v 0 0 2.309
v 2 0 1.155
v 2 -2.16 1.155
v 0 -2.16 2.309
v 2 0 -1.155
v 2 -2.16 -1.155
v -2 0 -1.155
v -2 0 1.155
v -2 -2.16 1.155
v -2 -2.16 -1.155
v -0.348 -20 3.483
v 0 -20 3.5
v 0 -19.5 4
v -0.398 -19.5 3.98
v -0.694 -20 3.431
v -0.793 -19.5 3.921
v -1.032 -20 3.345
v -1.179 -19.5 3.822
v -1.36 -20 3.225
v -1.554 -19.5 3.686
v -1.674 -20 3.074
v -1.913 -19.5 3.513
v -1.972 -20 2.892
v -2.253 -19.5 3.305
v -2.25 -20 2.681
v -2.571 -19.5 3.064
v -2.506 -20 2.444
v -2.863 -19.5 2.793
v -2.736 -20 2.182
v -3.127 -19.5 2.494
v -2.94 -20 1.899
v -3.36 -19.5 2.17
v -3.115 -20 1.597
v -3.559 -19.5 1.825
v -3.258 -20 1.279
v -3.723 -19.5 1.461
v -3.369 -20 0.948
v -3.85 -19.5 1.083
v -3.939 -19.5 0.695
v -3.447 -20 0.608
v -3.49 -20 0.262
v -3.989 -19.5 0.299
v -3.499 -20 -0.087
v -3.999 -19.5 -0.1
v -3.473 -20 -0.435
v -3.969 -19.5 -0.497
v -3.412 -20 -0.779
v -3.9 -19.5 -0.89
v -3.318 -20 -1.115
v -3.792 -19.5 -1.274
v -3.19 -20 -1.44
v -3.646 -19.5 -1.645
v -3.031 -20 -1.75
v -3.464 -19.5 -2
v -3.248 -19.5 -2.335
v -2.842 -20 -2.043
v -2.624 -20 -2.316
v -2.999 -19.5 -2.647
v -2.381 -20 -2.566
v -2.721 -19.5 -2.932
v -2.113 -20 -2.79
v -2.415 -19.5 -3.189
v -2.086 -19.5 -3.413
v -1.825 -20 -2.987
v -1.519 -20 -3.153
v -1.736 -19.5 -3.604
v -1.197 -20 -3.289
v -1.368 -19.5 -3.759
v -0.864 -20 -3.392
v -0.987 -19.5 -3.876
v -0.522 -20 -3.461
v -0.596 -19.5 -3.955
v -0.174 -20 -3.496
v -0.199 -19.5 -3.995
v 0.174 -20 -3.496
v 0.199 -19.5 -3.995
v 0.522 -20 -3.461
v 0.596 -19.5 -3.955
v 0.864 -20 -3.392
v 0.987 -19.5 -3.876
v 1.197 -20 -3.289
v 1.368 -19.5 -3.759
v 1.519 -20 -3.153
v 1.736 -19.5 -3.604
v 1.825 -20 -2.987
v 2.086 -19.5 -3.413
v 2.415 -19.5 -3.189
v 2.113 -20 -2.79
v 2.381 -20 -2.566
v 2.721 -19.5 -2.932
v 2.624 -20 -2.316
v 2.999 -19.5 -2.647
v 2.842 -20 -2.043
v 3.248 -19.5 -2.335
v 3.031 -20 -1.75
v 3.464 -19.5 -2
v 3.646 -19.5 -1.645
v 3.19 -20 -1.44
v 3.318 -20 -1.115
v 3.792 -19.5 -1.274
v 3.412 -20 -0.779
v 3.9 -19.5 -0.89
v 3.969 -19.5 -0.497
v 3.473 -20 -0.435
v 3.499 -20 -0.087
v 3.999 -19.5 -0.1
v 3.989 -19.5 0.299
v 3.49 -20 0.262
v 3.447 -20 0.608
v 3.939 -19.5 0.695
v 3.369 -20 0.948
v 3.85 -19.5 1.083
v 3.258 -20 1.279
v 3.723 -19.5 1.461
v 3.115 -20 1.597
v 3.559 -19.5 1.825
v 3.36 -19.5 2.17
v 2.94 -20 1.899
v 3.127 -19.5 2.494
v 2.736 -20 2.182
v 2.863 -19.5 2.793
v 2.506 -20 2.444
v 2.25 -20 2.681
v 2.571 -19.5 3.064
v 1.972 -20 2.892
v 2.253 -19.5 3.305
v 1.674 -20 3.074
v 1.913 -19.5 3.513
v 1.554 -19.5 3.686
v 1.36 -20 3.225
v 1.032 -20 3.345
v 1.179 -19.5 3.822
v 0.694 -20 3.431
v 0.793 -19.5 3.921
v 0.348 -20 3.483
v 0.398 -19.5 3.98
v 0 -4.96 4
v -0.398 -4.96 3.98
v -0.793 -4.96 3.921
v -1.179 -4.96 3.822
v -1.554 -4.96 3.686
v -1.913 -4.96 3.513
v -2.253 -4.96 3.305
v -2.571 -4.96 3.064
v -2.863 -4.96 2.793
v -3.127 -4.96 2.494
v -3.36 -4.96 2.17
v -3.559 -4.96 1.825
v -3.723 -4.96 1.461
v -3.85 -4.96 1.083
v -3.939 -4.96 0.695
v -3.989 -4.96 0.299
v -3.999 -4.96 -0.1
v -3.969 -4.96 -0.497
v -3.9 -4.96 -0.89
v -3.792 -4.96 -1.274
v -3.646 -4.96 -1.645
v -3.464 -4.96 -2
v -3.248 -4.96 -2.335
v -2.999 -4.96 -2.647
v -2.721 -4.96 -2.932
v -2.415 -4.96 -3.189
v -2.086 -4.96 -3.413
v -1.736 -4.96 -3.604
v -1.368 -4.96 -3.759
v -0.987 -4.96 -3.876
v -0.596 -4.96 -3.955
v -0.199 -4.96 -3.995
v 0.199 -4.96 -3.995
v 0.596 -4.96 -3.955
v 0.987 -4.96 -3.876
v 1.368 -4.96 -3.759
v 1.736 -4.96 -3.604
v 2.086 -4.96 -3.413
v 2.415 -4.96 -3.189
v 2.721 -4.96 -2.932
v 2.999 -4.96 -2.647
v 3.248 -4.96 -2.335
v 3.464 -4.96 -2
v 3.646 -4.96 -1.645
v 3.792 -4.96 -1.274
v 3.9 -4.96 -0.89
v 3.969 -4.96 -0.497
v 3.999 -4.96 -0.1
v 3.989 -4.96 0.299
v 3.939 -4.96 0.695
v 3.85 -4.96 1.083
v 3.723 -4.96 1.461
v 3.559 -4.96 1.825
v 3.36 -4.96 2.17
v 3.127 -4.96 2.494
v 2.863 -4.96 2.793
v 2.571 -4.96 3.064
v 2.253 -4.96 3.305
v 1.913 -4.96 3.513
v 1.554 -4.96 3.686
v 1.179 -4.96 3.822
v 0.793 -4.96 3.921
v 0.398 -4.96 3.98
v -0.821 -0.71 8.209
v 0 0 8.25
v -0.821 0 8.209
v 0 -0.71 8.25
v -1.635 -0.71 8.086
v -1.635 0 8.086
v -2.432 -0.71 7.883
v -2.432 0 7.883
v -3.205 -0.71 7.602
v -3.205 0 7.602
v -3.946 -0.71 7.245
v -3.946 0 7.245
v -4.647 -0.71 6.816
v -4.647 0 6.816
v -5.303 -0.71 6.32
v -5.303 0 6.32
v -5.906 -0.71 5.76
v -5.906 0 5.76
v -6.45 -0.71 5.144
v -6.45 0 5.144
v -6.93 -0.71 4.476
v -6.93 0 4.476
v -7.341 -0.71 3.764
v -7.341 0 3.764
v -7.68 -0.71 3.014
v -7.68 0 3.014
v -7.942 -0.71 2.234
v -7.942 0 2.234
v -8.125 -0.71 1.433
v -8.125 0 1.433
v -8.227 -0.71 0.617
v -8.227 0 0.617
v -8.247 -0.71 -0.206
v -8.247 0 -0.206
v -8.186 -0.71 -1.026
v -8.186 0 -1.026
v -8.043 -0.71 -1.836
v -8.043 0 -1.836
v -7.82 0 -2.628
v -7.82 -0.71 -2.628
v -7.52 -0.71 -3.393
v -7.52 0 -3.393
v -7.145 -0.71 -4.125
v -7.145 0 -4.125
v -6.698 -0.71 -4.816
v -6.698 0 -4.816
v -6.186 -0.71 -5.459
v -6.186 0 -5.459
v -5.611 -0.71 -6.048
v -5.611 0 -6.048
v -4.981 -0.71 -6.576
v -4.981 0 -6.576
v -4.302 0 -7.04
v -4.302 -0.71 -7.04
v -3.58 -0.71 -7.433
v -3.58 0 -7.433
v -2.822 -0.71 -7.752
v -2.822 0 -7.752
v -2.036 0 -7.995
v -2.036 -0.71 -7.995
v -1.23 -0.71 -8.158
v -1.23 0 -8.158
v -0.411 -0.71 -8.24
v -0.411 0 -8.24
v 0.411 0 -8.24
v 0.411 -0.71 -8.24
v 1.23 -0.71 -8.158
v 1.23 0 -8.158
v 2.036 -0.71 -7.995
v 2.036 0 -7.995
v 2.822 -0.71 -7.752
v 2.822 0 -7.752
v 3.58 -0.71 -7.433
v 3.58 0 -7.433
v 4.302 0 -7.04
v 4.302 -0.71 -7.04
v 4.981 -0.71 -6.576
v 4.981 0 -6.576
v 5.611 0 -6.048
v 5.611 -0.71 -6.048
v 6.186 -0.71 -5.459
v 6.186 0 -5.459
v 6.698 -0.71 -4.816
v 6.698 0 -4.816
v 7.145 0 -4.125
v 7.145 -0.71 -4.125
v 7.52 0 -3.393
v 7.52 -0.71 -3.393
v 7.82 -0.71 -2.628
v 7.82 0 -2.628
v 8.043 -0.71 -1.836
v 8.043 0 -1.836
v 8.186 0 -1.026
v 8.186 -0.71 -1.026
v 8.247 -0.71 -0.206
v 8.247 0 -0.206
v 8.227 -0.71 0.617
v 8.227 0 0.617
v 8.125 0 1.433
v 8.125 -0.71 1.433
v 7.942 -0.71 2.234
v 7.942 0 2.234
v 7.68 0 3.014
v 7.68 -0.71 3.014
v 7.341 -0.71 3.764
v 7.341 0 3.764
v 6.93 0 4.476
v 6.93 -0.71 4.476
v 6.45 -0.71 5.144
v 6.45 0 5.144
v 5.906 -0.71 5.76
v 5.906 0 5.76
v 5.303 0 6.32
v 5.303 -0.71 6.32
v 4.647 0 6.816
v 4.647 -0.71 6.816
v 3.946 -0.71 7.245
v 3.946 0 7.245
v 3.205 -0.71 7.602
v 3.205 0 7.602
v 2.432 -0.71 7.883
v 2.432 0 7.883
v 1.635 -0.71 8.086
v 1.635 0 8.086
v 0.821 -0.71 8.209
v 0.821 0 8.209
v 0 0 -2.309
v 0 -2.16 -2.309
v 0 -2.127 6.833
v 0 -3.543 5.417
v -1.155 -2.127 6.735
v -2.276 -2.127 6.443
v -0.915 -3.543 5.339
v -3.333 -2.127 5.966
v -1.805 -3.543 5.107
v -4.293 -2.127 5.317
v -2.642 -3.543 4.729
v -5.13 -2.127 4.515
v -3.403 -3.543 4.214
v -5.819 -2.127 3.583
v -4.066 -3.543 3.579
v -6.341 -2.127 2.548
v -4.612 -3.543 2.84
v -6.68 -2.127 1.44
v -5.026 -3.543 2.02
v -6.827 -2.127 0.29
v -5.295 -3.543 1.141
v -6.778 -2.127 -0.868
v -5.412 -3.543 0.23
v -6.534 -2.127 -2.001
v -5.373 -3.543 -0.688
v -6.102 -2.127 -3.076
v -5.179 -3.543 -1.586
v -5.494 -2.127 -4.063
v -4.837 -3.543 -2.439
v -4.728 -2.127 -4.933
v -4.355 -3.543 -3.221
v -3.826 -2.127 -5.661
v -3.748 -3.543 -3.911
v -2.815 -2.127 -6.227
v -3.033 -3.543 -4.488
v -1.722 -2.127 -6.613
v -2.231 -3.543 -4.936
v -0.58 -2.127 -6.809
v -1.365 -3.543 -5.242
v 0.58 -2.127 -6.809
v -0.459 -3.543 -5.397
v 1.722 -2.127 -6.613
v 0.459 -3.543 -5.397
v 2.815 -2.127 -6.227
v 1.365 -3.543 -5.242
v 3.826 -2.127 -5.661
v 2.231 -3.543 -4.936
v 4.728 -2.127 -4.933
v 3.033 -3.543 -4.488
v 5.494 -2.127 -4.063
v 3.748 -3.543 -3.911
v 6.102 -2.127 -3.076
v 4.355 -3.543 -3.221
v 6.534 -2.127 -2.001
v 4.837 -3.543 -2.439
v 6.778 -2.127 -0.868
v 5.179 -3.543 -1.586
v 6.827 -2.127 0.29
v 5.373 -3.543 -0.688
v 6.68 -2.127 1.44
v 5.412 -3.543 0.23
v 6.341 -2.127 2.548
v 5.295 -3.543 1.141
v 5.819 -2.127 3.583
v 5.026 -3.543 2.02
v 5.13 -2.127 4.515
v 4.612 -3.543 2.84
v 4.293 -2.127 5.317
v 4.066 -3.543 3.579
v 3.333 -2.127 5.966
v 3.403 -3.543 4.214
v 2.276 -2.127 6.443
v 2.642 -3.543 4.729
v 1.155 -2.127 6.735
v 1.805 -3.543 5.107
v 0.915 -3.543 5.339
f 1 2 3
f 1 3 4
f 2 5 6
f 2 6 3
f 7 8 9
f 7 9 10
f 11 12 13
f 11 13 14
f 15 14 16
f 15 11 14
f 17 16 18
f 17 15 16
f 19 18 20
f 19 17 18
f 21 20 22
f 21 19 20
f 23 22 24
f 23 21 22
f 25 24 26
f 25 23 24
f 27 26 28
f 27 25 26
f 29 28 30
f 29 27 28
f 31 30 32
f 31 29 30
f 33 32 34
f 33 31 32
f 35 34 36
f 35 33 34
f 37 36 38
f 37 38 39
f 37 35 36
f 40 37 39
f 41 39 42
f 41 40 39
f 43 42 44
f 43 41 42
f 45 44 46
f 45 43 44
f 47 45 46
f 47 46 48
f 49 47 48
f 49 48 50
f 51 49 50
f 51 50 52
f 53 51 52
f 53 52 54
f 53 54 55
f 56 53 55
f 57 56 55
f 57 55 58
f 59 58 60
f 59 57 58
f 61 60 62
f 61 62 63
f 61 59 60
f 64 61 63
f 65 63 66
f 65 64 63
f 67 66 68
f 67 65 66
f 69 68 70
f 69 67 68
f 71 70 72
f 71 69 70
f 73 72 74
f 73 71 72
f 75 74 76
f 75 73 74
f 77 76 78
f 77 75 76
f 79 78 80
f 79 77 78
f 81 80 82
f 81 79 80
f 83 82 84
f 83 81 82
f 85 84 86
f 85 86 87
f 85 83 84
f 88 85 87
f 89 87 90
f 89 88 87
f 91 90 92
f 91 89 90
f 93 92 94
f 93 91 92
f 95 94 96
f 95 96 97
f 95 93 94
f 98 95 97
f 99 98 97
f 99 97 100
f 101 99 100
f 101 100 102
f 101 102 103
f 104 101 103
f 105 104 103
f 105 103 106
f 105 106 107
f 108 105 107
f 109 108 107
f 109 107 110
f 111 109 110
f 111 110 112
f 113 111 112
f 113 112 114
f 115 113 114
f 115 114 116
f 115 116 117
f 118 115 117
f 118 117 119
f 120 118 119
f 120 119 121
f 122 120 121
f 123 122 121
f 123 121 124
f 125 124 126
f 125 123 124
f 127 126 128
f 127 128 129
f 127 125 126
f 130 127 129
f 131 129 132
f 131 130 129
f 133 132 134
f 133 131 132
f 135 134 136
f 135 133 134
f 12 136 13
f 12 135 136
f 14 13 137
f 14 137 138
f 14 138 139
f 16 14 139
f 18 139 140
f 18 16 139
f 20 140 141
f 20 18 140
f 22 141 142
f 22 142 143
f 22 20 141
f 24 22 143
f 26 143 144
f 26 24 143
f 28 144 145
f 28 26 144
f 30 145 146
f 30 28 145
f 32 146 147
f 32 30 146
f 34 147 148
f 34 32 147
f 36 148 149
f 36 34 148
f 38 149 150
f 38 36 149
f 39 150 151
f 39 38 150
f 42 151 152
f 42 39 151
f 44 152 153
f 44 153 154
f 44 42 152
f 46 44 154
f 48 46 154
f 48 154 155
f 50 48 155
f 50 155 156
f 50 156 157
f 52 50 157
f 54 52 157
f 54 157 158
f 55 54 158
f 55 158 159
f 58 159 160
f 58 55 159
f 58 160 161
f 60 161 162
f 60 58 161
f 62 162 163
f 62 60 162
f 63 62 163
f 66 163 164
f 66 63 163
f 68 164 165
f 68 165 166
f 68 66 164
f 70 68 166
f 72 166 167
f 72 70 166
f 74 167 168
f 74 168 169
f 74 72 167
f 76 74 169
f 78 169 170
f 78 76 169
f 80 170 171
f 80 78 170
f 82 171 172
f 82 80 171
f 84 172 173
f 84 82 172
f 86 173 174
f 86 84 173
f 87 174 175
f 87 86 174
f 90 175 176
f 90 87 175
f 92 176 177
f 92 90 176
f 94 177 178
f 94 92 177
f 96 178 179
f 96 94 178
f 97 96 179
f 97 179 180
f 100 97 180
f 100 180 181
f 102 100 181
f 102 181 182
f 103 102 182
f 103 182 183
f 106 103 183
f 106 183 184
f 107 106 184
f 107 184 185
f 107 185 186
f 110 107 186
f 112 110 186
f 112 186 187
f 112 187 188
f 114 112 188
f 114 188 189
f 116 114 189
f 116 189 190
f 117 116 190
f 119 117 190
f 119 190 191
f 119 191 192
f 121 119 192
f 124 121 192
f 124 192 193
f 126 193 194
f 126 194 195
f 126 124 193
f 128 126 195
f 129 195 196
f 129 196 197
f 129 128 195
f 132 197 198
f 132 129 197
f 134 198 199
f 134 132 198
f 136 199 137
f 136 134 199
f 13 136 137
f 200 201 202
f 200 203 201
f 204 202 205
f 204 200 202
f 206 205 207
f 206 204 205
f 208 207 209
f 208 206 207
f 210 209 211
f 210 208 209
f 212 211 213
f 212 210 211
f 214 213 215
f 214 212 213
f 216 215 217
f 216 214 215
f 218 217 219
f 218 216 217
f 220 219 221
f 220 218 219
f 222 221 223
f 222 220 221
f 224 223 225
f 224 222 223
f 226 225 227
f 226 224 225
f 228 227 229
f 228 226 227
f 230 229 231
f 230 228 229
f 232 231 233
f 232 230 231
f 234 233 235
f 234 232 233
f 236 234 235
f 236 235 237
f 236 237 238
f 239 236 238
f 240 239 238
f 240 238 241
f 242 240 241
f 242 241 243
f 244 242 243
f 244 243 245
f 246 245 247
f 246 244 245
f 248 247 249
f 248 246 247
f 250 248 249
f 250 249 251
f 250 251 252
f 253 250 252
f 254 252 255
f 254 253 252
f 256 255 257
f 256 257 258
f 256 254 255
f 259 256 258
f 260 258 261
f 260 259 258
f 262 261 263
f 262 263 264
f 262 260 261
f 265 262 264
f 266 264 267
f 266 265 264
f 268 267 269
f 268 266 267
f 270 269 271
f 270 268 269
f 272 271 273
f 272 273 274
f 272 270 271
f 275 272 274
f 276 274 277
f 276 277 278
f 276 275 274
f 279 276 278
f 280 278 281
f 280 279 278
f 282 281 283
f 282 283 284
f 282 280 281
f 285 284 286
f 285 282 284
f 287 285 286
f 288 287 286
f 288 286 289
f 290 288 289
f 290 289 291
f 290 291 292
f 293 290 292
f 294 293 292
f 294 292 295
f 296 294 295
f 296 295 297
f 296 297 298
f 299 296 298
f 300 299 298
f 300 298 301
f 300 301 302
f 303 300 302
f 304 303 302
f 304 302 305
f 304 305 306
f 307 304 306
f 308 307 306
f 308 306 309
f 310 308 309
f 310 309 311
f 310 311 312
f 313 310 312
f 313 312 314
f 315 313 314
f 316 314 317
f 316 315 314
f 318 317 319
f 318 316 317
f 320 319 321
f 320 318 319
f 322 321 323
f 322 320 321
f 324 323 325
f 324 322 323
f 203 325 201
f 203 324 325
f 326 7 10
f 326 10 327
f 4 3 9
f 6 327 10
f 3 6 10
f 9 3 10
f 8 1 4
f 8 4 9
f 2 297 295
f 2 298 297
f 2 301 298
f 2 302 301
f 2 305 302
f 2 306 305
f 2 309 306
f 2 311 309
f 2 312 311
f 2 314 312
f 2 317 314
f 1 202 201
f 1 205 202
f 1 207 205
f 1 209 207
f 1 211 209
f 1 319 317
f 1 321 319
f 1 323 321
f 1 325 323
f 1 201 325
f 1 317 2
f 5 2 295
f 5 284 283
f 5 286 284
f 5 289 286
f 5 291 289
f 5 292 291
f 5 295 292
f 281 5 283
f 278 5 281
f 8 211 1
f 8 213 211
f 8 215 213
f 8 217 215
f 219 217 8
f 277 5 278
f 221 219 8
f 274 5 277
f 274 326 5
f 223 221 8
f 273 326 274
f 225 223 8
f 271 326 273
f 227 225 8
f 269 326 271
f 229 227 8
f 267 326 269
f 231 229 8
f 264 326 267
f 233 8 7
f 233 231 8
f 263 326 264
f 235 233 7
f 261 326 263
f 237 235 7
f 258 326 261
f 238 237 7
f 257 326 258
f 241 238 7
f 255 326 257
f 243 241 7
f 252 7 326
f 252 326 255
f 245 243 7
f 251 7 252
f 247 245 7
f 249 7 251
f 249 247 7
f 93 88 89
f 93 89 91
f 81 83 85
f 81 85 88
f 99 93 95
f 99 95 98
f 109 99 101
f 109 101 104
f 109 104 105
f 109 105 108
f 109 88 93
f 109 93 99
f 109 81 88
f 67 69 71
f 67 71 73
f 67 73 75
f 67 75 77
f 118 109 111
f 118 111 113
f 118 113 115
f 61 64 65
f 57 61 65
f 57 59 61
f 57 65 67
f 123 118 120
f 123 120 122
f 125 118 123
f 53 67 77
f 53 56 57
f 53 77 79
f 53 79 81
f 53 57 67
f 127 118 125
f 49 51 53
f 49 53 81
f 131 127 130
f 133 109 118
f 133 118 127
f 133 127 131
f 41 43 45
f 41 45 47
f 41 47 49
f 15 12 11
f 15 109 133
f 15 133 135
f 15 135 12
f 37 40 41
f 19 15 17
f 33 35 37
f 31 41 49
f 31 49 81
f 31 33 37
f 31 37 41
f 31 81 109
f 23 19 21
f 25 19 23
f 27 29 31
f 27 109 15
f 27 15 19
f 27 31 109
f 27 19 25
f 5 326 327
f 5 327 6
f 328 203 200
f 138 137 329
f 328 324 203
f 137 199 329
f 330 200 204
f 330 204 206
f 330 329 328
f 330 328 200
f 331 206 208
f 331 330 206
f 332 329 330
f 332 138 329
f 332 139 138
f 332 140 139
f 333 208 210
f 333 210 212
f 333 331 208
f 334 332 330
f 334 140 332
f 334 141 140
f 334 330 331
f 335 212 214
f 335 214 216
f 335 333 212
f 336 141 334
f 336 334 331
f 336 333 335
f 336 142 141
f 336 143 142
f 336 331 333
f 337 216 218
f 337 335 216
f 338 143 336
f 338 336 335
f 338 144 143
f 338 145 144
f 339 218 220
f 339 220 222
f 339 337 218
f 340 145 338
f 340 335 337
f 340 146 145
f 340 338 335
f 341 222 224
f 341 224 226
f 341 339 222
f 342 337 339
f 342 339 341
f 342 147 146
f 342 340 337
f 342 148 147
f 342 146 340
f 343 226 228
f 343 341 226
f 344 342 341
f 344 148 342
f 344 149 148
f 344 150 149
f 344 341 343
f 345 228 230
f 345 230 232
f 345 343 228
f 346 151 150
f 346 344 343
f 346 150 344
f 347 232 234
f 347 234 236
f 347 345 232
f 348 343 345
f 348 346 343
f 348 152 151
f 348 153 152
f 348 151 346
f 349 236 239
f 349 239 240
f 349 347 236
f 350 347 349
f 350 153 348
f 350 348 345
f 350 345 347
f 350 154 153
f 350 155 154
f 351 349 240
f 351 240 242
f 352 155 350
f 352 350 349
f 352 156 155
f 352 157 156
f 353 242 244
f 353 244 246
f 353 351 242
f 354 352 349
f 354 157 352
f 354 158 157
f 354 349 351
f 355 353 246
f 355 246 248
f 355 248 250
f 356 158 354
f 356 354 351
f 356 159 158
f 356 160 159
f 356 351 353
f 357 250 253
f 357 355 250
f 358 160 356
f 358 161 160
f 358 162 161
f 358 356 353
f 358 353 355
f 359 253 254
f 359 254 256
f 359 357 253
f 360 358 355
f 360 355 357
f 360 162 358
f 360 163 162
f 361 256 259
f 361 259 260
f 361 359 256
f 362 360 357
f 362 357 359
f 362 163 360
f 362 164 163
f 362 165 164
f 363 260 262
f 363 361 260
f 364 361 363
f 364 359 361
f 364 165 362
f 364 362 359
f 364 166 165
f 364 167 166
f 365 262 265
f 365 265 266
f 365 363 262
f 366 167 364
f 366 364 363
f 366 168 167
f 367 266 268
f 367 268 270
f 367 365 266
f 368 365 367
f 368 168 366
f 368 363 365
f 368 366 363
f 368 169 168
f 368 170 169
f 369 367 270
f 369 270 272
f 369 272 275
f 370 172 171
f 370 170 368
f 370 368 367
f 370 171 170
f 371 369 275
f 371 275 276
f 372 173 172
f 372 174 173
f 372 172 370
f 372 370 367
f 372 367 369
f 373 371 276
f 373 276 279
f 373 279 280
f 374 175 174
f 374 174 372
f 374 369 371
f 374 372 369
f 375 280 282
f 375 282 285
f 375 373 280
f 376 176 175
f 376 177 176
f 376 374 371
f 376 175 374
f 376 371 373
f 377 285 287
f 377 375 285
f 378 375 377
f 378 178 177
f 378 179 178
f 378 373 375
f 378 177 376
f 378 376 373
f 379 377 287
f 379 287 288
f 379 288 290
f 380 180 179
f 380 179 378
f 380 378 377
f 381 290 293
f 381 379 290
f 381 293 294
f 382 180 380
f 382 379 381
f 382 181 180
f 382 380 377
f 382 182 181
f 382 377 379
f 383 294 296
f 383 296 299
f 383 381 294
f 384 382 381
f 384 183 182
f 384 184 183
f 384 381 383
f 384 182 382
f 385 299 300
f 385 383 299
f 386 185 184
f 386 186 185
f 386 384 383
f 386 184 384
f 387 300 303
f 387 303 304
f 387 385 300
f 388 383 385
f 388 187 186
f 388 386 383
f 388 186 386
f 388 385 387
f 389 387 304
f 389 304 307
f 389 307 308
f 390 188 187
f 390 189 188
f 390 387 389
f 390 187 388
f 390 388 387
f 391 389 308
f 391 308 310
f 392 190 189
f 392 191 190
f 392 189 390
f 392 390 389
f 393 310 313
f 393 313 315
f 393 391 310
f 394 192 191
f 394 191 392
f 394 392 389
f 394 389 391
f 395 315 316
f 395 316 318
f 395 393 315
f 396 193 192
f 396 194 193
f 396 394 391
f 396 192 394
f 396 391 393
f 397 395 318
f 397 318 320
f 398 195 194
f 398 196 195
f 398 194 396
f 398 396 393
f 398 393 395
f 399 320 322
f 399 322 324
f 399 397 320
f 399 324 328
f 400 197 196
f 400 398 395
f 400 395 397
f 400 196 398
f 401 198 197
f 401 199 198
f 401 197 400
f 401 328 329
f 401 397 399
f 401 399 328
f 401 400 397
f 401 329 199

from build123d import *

# Parameters (mm, degrees)
CUT_EXTRUDE1_DEPTH = 2.16
CHAMFER1_SIZE      = 0.5


with BuildPart() as part:
    # Sketch2 → Revolve1 (revolve)
    with BuildSketch(Plane.XY, mode=Mode.PRIVATE) as revolve1_sk:
        Polygon((0, 0), (8.25, 0), (8.25, -0.71), (4, -4.96), (4, -20), (0, -20), align=None)
    revolve(revolve1_sk.sketch.rotate(Axis((0, 0, 0), (0, -1, 0)), 90), axis=Axis((0, 0, 0), (0, -1, 0)))

    # Sketch3 → Cut-Extrude1 (cut)
    with BuildSketch(Plane(origin=(0, 0, 0), x_dir=(1, 0, 0), z_dir=(0, 1, 0))):
        Polygon((0, 2.309401077), (2, 1.154700538), (2, -1.154700538), (0, -2.309401077), (-2, -1.154700538), (-2, 1.154700538), align=None)
    extrude(amount=-CUT_EXTRUDE1_DEPTH, mode=Mode.SUBTRACT)

    # Chamfer1
    chamfer1_edges = [part.edges().sort_by_distance(p)[0] for p in [
        (0, -20, -4),
    ]]
    chamfer(chamfer1_edges, length=CHAMFER1_SIZE)


solid = part.part
